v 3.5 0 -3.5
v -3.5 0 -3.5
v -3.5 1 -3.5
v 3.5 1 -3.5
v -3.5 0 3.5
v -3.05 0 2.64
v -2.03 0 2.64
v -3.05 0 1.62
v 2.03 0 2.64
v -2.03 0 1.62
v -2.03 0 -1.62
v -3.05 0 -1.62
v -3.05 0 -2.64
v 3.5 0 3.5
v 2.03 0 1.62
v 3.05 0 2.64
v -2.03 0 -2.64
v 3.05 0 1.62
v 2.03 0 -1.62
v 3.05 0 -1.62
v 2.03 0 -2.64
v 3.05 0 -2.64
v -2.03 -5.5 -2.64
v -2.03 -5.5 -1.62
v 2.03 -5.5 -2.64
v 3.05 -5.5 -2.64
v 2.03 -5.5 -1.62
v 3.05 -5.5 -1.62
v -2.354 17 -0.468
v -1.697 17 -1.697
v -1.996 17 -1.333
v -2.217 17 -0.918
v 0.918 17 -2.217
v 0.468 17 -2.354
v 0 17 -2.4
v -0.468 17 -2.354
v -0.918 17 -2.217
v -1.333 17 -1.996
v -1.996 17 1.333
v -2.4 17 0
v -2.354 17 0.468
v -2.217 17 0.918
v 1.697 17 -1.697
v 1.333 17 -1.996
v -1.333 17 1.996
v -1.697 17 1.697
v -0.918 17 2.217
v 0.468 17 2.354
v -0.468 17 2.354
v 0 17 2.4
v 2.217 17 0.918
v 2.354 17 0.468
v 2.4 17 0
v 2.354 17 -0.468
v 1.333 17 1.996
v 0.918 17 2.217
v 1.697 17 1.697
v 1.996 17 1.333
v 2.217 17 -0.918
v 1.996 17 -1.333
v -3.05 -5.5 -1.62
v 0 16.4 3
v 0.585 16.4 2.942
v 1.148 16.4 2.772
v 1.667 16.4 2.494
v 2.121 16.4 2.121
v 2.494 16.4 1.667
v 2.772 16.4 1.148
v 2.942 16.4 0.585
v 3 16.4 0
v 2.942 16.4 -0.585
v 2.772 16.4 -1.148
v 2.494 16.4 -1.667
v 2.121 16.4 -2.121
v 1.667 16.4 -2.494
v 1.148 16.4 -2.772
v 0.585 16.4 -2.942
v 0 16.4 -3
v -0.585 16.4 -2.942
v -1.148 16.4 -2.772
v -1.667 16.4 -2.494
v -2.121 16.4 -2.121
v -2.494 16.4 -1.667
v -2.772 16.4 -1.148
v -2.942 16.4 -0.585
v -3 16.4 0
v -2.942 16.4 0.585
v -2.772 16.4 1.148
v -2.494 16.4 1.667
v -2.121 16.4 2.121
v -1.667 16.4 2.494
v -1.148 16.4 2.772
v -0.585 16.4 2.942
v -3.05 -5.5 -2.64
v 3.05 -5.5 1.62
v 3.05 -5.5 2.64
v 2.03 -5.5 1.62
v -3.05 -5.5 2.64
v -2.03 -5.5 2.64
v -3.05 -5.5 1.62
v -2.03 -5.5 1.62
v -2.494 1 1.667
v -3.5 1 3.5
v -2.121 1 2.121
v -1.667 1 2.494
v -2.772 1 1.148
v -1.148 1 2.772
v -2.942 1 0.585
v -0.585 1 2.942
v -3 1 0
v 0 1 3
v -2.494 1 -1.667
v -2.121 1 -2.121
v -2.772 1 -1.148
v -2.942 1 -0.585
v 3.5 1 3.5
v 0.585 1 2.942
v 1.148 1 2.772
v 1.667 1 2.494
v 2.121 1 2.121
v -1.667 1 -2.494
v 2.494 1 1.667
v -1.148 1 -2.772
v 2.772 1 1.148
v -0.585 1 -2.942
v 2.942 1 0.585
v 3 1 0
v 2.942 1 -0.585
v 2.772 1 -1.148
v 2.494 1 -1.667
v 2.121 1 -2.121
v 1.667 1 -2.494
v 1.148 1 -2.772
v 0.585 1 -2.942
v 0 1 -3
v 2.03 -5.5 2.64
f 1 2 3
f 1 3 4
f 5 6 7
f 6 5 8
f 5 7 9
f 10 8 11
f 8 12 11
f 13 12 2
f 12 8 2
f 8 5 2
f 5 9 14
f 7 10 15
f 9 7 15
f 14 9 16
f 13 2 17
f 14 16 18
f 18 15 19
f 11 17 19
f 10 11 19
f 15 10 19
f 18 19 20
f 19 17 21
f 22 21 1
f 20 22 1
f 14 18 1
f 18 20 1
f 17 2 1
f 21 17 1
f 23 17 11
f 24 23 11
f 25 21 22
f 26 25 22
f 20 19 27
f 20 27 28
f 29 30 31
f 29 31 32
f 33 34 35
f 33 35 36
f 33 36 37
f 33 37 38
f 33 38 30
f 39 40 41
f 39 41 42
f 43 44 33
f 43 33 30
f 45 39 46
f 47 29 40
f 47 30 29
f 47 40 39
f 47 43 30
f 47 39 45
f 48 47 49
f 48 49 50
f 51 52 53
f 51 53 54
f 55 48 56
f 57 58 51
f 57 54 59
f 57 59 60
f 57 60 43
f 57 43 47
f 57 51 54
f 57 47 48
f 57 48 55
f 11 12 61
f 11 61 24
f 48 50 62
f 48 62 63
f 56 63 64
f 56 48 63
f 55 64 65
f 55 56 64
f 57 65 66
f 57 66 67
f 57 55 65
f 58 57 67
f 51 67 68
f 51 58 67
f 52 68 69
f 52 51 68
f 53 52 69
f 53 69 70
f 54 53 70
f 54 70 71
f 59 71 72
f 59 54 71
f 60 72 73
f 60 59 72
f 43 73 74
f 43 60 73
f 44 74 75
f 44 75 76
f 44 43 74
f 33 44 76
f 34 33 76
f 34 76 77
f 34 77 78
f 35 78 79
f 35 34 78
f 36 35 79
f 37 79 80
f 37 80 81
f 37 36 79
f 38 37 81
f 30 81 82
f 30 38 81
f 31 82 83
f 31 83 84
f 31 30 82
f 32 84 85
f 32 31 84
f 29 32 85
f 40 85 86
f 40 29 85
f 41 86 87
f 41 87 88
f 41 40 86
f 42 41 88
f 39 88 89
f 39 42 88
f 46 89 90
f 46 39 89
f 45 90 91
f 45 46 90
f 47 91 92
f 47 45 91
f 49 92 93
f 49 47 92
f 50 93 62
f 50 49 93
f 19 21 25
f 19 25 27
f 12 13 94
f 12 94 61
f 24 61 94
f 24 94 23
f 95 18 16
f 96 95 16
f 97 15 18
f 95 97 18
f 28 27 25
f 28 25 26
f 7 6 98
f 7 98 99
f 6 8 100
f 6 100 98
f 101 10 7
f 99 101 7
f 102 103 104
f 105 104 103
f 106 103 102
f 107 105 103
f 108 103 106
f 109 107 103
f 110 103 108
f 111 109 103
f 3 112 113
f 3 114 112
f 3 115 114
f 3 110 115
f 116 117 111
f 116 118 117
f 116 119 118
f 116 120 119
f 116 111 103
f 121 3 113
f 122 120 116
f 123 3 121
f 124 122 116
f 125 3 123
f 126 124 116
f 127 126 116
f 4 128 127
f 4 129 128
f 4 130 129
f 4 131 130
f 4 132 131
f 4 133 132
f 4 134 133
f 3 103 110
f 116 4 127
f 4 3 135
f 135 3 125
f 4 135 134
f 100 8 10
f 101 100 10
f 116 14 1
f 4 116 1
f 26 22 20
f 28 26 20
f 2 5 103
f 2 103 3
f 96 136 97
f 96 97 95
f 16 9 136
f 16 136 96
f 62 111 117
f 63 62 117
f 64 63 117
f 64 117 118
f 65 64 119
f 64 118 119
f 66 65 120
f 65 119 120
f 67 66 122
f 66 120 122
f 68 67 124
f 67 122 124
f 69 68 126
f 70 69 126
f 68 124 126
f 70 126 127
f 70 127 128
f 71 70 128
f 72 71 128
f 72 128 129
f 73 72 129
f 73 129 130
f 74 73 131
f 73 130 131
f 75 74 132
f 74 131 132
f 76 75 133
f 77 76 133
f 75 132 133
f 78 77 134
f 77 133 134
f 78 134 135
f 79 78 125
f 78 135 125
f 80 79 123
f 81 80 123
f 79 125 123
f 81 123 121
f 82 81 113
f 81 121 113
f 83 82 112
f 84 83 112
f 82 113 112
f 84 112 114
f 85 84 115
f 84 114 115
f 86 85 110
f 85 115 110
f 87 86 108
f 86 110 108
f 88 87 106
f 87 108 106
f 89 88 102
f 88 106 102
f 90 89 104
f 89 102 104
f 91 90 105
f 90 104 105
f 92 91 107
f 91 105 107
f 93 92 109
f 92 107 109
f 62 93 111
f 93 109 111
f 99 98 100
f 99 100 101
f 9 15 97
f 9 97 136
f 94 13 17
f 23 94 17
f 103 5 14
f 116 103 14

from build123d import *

# Parameters (mm, degrees)
SKETCH1_W           = 7
SKETCH1_H           = 7
BOSS_EXTRUDE1_DEPTH = 1
SKETCH2_W           = 1.02
SKETCH2_H           = 1.02
BOSS_EXTRUDE2_DEPTH = 5.5
SKETCH4_R           = 3
BOSS_EXTRUDE3_DEPTH = 16
CHAMFER1_SIZE       = 0.6


with BuildPart() as part:
    # Sketch1 → Boss-Extrude1 (new body)
    with BuildSketch(Plane(origin=(0, 0, 0), x_dir=(1, 0, 0), z_dir=(0, 1, 0))):
        Rectangle(SKETCH1_W, SKETCH1_H)
    extrude(amount=BOSS_EXTRUDE1_DEPTH)

    # Sketch2 → Boss-Extrude2 (add)
    with BuildSketch(Plane.XZ):
        with Locations((-2.54, 2.129508614)):
            Rectangle(SKETCH2_W, SKETCH2_H)
        with Locations((-2.54, -2.129508614)):
            Rectangle(SKETCH2_W, SKETCH2_H)
        with Locations((2.54, 2.129508614)):
            Rectangle(SKETCH2_W, SKETCH2_H)
        with Locations((2.54, -2.129508614)):
            Rectangle(SKETCH2_W, SKETCH2_H)
    extrude(amount=BOSS_EXTRUDE2_DEPTH)

    # Sketch4 → Boss-Extrude3 (add)
    with BuildSketch(Plane(origin=(0, 1, 0), x_dir=(1, 0, 0), z_dir=(0, 1, 0))):
        with Locations(Location((0, 0, 0), (0, 0, 270))):
            Circle(SKETCH4_R)
    extrude(amount=BOSS_EXTRUDE3_DEPTH)

    # Chamfer1
    chamfer1_edges = [part.edges().sort_by_distance(p)[0] for p in [
        (0, 17, -3),
    ]]
    chamfer(chamfer1_edges, length=CHAMFER1_SIZE)


solid = part.part
